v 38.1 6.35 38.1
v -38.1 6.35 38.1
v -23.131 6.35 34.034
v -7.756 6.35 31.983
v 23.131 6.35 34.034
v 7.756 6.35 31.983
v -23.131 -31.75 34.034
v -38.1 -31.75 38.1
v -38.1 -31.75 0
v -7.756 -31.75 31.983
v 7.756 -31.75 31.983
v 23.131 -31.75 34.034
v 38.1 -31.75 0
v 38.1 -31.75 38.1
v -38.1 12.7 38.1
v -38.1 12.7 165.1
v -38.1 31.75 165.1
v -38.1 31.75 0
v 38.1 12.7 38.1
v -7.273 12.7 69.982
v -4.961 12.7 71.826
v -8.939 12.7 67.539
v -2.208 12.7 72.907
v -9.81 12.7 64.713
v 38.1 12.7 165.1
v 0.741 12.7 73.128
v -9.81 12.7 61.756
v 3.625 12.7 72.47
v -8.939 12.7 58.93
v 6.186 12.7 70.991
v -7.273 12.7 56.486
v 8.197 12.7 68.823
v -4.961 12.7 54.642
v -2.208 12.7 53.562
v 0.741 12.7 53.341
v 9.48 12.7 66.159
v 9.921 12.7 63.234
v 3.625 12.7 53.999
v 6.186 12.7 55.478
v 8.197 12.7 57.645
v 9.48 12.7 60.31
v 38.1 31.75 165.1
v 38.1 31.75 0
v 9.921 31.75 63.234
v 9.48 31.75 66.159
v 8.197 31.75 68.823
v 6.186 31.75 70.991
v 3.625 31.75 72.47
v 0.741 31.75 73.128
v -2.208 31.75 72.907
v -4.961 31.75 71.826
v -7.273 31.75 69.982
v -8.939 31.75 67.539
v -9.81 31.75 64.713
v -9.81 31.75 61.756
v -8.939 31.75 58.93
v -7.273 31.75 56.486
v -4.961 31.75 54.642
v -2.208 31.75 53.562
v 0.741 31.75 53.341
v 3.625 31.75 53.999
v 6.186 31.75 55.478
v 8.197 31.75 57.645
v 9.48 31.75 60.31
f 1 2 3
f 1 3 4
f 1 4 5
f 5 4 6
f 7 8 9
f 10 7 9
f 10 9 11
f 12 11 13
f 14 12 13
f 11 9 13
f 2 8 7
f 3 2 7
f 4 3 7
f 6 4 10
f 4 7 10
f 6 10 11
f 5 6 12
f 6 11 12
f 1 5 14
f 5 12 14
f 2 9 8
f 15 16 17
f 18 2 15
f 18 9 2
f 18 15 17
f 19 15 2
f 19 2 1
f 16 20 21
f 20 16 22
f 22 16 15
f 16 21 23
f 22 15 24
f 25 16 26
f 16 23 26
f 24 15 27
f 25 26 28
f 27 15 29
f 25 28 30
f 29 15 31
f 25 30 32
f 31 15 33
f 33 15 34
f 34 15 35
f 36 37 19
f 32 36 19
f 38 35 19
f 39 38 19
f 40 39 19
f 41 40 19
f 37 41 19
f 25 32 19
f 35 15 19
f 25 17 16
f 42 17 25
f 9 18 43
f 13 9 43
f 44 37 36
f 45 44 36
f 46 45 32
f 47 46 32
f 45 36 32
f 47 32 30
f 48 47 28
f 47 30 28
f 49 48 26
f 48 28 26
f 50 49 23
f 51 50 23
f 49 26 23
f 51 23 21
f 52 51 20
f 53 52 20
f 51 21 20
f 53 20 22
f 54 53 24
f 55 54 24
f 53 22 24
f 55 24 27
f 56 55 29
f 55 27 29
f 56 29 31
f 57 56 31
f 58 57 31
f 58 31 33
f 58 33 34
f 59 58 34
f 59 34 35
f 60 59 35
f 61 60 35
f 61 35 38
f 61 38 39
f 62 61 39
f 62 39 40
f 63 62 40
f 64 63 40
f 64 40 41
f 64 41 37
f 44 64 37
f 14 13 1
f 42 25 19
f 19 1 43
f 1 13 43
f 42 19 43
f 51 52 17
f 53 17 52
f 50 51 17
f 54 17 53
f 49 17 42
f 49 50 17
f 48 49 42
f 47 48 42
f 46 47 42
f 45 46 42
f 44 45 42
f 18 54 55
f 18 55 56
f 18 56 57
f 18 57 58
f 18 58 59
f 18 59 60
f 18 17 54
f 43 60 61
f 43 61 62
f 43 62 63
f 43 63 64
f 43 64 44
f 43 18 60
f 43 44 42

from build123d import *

# Parameters (mm, degrees)
F0_W     = 76.2
F0_H     = 63.5
F1_DEPTH = 38.1
F2_W     = 76.2
F2_H     = 19.05
F7_DEPTH = 127
F4_D     = 19.84248
F6_DEPTH = 38.1


with BuildPart() as f1:
    # F0 (on Top) → F1 (new body)
    with BuildSketch(Plane.XY):
        Rectangle(F0_W, F0_H)
    extrude(amount=F1_DEPTH)

    # F2 (on face) → F7 (join)
    with BuildSketch(Plane.XY.offset(38.1)):
        with Locations((0, 22.225)):
            Rectangle(F2_W, F2_H)
    extrude(amount=F7_DEPTH)

    # F4 (through all)
    with Locations(Plane(origin=(0, 31.75, 0), x_dir=(-1, 0, 0), z_dir=(0, 1, 0))):
        with Locations((0, 63.2342693158)):
            Hole(F4_D / 2)

    # F5 (on face) → F6 (cut, through all)
    with BuildSketch(Plane.XZ.offset(31.75)):
        with BuildLine():
            Line((38.1, 38.1), (-38.1, 38.1))
            ThreePointArc((-38.1, 38.1), (0, 31.7262437458), (38.1, 38.1))
        make_face()
    extrude(amount=-F6_DEPTH, mode=Mode.SUBTRACT)


solid = f1.part
